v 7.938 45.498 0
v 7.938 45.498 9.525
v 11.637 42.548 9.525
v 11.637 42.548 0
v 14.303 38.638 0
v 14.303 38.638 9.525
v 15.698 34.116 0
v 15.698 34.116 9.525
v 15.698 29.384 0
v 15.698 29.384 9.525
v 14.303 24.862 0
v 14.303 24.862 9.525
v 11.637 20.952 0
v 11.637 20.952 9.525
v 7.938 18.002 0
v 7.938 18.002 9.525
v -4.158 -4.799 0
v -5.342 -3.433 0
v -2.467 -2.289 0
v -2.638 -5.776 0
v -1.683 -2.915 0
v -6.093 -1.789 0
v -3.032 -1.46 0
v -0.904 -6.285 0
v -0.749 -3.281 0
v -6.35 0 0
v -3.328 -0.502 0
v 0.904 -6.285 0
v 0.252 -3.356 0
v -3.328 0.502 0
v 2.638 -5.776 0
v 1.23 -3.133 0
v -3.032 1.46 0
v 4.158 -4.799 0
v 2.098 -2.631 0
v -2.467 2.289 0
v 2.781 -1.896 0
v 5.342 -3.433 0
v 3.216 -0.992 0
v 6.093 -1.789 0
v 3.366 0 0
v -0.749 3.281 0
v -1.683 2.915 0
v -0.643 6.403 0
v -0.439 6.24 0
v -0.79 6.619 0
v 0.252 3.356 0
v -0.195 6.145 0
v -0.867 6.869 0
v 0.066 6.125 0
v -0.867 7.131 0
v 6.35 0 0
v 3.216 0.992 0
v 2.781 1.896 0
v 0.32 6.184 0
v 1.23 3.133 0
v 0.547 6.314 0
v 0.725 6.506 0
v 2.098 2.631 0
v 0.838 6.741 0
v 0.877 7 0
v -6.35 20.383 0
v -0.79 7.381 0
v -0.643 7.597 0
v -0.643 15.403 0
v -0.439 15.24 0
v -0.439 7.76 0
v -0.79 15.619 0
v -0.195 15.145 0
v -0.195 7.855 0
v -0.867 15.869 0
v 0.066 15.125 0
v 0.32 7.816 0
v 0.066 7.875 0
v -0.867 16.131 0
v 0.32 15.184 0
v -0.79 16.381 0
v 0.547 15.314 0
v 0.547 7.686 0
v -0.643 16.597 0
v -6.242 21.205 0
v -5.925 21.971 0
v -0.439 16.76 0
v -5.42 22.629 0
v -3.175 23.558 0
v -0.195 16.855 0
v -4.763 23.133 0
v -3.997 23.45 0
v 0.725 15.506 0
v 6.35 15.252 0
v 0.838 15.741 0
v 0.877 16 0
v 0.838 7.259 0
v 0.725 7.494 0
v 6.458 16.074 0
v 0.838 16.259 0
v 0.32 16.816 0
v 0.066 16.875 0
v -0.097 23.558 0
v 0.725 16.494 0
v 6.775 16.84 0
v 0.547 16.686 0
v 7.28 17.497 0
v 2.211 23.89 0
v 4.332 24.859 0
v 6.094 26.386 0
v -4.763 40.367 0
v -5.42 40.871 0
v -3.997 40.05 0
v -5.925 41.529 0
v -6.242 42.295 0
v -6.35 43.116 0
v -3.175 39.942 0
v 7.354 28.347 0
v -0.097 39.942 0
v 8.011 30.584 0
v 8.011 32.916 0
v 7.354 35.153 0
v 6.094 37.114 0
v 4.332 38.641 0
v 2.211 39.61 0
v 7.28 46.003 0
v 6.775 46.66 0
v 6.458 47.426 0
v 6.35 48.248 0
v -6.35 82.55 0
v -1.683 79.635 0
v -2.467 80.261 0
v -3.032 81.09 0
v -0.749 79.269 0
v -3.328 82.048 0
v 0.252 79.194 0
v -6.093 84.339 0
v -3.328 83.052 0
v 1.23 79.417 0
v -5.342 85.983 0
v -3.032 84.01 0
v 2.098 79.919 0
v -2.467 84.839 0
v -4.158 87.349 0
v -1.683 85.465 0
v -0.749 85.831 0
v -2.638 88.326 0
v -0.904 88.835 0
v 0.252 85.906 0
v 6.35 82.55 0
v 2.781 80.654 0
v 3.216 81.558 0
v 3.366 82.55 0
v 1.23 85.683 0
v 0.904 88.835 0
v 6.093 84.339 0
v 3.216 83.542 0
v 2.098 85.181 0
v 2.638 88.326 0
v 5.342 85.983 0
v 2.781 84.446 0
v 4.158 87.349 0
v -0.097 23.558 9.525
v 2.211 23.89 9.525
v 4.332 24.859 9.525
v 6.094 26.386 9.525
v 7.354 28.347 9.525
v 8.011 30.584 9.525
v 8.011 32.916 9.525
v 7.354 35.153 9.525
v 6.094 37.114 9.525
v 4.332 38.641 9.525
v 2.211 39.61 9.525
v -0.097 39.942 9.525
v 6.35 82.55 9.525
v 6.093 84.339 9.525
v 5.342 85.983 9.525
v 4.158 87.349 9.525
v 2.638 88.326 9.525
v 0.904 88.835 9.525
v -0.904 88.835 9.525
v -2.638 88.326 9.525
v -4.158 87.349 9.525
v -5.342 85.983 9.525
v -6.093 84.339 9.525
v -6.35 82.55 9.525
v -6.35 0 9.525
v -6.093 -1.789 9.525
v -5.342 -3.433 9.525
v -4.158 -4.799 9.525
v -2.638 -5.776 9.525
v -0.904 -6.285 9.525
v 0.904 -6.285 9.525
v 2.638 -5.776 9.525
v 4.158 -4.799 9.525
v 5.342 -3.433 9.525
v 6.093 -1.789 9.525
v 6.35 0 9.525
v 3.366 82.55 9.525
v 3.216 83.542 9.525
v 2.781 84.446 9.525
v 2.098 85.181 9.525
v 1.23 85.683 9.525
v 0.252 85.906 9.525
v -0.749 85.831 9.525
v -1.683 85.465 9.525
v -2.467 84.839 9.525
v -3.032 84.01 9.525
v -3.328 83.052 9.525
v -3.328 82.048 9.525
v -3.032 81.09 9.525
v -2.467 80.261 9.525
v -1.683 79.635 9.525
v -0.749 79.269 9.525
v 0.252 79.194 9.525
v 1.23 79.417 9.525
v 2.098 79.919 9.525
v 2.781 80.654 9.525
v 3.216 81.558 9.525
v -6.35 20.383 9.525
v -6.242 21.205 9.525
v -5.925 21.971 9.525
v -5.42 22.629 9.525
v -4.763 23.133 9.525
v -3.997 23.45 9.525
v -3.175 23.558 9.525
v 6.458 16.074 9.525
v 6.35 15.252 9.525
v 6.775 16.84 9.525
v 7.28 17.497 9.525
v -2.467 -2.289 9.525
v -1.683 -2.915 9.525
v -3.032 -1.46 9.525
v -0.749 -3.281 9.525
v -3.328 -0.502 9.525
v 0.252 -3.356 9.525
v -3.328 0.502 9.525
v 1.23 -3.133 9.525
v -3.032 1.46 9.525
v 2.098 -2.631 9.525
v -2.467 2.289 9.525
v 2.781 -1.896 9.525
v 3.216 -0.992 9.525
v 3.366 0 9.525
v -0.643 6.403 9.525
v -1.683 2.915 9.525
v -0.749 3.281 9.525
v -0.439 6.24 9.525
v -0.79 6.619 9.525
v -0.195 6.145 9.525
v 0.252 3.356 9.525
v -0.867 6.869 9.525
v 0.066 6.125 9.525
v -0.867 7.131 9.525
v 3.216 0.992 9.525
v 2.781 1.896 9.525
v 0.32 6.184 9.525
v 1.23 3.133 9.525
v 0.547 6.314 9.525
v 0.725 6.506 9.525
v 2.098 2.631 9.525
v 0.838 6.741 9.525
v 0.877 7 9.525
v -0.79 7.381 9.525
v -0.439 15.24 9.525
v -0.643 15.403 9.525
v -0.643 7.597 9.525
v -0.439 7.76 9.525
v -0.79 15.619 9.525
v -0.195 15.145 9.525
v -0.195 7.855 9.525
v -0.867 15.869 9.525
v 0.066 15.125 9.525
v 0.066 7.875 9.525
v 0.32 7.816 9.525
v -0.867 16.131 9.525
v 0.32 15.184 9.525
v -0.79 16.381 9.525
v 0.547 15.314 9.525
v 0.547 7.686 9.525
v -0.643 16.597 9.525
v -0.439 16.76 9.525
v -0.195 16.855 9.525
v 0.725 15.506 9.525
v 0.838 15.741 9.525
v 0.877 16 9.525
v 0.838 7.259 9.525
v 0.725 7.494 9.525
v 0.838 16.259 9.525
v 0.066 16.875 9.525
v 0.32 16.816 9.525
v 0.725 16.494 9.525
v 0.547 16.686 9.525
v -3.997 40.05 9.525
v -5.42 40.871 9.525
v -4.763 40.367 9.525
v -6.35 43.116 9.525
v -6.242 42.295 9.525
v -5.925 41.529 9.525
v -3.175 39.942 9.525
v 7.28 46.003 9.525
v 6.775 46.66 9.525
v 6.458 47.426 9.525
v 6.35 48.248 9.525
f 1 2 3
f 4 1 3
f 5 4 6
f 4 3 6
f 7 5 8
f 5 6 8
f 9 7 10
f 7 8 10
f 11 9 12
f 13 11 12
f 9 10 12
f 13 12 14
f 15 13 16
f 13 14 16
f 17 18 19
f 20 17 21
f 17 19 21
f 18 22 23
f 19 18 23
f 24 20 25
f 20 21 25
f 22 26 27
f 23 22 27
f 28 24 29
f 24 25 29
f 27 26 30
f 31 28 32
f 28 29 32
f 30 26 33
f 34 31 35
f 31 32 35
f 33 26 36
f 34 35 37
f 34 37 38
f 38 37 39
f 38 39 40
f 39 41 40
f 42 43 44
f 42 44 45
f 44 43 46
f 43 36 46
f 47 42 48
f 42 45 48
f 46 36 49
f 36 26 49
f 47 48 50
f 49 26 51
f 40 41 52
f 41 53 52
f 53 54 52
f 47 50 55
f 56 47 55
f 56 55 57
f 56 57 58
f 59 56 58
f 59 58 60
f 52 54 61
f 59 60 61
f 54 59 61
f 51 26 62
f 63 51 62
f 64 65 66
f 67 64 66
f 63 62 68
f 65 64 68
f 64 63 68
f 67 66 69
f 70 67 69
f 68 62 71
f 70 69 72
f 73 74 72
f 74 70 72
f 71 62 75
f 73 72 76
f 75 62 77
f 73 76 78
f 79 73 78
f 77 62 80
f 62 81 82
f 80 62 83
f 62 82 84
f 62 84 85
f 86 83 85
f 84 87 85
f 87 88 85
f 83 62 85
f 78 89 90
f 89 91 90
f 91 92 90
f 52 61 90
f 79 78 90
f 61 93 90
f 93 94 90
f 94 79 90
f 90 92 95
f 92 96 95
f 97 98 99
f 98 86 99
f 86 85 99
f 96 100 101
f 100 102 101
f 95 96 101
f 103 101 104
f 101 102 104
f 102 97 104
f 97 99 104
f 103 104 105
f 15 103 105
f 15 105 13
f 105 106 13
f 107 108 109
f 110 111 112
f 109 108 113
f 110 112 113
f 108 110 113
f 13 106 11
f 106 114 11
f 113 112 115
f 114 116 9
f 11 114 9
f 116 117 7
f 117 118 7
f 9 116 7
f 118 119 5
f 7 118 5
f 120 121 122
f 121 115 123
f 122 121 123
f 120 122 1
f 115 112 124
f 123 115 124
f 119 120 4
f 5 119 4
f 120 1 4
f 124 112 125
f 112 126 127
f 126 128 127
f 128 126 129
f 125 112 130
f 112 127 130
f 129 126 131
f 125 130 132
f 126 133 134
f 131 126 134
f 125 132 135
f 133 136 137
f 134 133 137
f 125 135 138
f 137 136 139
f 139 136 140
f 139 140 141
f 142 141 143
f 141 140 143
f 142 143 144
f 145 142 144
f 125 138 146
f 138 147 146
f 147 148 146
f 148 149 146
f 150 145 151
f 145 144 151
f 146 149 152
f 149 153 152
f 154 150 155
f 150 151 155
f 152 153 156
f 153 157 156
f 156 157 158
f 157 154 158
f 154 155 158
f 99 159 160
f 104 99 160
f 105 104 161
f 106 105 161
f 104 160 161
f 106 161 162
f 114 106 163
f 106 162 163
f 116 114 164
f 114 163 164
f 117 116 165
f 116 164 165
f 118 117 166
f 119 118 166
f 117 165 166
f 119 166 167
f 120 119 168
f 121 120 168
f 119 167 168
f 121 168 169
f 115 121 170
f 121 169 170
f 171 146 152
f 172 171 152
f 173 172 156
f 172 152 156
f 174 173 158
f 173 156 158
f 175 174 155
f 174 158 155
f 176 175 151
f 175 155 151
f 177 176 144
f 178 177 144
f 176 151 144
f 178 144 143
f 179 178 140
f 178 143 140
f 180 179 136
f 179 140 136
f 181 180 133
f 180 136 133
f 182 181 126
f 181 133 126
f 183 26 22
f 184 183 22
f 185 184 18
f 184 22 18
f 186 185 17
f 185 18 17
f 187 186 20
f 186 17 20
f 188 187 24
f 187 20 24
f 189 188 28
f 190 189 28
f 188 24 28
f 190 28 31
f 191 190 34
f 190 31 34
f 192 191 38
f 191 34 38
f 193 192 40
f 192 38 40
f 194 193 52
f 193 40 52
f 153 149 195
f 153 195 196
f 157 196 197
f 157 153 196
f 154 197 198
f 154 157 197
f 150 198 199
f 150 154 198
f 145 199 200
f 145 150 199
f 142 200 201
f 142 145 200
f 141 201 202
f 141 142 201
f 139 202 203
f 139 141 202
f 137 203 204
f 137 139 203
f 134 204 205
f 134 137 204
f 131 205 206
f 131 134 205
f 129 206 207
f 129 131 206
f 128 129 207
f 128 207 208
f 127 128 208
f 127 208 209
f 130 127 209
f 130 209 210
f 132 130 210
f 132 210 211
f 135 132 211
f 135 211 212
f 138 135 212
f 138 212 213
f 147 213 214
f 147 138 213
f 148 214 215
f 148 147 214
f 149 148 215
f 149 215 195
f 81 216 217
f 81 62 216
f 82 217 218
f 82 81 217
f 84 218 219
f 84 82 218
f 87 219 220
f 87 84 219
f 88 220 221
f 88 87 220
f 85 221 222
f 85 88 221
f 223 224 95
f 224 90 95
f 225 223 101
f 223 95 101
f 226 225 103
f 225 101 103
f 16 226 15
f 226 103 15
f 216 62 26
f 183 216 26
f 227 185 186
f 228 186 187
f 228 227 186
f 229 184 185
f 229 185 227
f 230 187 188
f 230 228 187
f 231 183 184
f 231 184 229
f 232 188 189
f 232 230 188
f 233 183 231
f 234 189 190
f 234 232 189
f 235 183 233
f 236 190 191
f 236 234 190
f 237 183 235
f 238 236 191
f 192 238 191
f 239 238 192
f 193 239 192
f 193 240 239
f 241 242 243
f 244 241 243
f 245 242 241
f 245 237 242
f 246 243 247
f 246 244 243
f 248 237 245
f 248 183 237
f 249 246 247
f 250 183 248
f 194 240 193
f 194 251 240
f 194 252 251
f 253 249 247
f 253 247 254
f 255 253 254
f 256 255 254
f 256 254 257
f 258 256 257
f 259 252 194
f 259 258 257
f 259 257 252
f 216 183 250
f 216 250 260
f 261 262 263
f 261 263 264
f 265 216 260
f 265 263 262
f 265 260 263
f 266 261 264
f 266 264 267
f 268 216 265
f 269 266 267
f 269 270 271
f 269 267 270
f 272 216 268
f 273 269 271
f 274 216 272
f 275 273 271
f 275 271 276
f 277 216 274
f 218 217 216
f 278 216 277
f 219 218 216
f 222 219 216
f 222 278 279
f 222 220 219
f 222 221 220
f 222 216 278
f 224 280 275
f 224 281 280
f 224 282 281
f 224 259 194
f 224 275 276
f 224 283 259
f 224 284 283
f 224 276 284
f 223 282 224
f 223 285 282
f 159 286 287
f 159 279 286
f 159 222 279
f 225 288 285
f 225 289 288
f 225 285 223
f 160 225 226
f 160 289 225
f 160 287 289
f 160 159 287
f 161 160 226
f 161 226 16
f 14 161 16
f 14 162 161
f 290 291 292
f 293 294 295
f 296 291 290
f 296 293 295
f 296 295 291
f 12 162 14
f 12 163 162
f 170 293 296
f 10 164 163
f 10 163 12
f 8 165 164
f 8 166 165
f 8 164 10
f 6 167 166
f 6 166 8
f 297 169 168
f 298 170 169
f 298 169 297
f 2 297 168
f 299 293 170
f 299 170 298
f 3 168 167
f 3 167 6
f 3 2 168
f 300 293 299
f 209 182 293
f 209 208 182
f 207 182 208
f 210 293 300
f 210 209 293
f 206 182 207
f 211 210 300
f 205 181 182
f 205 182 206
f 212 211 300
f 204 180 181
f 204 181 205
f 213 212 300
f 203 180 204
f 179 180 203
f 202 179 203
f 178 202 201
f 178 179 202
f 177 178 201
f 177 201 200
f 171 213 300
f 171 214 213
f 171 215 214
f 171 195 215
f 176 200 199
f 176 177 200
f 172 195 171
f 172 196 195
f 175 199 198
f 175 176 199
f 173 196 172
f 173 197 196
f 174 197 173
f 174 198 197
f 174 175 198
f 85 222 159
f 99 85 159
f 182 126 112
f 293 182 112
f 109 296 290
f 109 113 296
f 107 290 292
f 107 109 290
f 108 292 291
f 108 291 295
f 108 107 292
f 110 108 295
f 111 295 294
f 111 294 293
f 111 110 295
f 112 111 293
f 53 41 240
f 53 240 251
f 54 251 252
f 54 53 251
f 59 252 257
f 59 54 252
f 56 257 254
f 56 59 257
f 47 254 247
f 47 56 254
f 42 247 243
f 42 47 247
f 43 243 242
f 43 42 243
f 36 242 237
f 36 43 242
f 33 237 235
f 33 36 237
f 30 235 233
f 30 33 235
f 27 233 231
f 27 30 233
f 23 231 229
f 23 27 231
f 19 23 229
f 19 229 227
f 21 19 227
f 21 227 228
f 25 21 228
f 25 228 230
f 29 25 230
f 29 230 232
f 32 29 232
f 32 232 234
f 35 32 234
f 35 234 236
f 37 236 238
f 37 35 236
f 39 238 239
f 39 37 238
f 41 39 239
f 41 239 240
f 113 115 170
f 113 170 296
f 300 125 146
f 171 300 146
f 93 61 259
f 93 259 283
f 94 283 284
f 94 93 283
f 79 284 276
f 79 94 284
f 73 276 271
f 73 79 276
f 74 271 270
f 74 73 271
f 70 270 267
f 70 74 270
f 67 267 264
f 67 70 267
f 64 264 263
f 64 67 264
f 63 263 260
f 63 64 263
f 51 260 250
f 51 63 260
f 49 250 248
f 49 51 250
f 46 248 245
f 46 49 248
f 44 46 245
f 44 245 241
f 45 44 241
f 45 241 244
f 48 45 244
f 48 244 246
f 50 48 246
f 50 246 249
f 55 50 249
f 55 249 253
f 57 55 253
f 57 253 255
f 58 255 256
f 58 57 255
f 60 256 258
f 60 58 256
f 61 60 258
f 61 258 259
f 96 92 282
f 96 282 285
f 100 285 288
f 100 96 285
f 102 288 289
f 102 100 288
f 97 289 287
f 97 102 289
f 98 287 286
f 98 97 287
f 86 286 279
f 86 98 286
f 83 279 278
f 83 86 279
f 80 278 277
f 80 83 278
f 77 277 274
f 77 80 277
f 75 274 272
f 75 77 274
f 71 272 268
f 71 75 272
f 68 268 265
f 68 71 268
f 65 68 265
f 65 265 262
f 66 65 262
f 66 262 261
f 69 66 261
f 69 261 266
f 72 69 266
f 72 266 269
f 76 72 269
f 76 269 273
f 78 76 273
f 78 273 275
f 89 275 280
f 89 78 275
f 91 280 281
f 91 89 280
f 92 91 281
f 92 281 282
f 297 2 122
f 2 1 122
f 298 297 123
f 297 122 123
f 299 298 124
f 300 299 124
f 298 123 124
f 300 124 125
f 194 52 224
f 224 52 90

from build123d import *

# Parameters (mm, degrees)
F_4_BAR_LINKAGE_NON_DRIVEN_BAR_OUTLINE_R   = 3.3655
F_4_BAR_LINKAGE_NON_DRIVEN_BAR_OUTLINE_R_2 = 0.877000024
F_4_BAR_LINKAGE_NON_DRIVEN_BAR_DEPTH       = 9.525
BOSS_EXTRUDE2_DEPTH                        = 9.525
CUT_EXTRUDE1_DEPTH                         = 91.807220253
FILLET1_R                                  = 3.175
FILLET3_R                                  = 3.175


# Read off the part's stored shape, not the designer's step: 4 bar linkage non-driven bar
with BuildPart() as part:
    # 4 bar linkage non-driven bar outline → 4 bar linkage non-driven bar (new body)
    with BuildSketch(Plane.XY):
        with BuildLine():
            ThreePointArc((-6.35, 0), (0, -6.35), (6.35, 0))
            Line((6.35, 0), (6.35, 82.55))
            ThreePointArc((6.35, 82.55), (0, 88.9), (-6.35, 82.55))
            Line((-6.35, 82.55), (-6.35, 0))
        make_face()
        Circle(F_4_BAR_LINKAGE_NON_DRIVEN_BAR_OUTLINE_R, mode=Mode.SUBTRACT)
        with Locations((0, 6.99999997)):
            Circle(F_4_BAR_LINKAGE_NON_DRIVEN_BAR_OUTLINE_R_2, mode=Mode.SUBTRACT)
        with Locations((0, 16.000000004)):
            Circle(F_4_BAR_LINKAGE_NON_DRIVEN_BAR_OUTLINE_R_2, mode=Mode.SUBTRACT)
        with Locations((0, 82.55)):
            Circle(F_4_BAR_LINKAGE_NON_DRIVEN_BAR_OUTLINE_R, mode=Mode.SUBTRACT)
    extrude(amount=F_4_BAR_LINKAGE_NON_DRIVEN_BAR_DEPTH)

    # Sketch2 → Boss-Extrude2 (add)
    with BuildSketch(Plane.XY.offset(9.525)):
        with BuildLine():
            Line((6.35, 17.200322169), (6.35, 46.299677831))
            ThreePointArc((6.35, 46.299677831), (15.875, 31.75), (6.35, 17.200322169))
        make_face()
    extrude(amount=-BOSS_EXTRUDE2_DEPTH)

    # Sketch1 → Cut-Extrude1 (cut, through all)
    with BuildSketch(Plane.XY.offset(9.525)):
        with BuildLine():
            Line((-0.096808673, 39.9415), (-6.35, 39.9415))
            Line((-6.35, 39.9415), (-6.35, 23.5585))
            Line((-6.35, 23.5585), (-0.096808673, 23.5585))
            ThreePointArc((-0.096808673, 23.5585), (8.094691327, 31.75), (-0.096808673, 39.9415))
        make_face()
    extrude(amount=-CUT_EXTRUDE1_DEPTH, mode=Mode.SUBTRACT)

    # Fillet1
    fillet1_edges = [part.edges().sort_by_distance(p)[0] for p in [
        (-6.35, 23.5585, 4.7625),
        (-6.35, 39.9415, 4.7625),
    ]]
    fillet(fillet1_edges, radius=FILLET1_R)

    # Fillet3
    fillet3_edges = [part.edges().sort_by_distance(p)[0] for p in [
        (6.35, 46.299677831, 4.7625),
        (6.35, 17.200322169, 4.7625),
    ]]
    fillet(fillet3_edges, radius=FILLET3_R)


solid = part.part
